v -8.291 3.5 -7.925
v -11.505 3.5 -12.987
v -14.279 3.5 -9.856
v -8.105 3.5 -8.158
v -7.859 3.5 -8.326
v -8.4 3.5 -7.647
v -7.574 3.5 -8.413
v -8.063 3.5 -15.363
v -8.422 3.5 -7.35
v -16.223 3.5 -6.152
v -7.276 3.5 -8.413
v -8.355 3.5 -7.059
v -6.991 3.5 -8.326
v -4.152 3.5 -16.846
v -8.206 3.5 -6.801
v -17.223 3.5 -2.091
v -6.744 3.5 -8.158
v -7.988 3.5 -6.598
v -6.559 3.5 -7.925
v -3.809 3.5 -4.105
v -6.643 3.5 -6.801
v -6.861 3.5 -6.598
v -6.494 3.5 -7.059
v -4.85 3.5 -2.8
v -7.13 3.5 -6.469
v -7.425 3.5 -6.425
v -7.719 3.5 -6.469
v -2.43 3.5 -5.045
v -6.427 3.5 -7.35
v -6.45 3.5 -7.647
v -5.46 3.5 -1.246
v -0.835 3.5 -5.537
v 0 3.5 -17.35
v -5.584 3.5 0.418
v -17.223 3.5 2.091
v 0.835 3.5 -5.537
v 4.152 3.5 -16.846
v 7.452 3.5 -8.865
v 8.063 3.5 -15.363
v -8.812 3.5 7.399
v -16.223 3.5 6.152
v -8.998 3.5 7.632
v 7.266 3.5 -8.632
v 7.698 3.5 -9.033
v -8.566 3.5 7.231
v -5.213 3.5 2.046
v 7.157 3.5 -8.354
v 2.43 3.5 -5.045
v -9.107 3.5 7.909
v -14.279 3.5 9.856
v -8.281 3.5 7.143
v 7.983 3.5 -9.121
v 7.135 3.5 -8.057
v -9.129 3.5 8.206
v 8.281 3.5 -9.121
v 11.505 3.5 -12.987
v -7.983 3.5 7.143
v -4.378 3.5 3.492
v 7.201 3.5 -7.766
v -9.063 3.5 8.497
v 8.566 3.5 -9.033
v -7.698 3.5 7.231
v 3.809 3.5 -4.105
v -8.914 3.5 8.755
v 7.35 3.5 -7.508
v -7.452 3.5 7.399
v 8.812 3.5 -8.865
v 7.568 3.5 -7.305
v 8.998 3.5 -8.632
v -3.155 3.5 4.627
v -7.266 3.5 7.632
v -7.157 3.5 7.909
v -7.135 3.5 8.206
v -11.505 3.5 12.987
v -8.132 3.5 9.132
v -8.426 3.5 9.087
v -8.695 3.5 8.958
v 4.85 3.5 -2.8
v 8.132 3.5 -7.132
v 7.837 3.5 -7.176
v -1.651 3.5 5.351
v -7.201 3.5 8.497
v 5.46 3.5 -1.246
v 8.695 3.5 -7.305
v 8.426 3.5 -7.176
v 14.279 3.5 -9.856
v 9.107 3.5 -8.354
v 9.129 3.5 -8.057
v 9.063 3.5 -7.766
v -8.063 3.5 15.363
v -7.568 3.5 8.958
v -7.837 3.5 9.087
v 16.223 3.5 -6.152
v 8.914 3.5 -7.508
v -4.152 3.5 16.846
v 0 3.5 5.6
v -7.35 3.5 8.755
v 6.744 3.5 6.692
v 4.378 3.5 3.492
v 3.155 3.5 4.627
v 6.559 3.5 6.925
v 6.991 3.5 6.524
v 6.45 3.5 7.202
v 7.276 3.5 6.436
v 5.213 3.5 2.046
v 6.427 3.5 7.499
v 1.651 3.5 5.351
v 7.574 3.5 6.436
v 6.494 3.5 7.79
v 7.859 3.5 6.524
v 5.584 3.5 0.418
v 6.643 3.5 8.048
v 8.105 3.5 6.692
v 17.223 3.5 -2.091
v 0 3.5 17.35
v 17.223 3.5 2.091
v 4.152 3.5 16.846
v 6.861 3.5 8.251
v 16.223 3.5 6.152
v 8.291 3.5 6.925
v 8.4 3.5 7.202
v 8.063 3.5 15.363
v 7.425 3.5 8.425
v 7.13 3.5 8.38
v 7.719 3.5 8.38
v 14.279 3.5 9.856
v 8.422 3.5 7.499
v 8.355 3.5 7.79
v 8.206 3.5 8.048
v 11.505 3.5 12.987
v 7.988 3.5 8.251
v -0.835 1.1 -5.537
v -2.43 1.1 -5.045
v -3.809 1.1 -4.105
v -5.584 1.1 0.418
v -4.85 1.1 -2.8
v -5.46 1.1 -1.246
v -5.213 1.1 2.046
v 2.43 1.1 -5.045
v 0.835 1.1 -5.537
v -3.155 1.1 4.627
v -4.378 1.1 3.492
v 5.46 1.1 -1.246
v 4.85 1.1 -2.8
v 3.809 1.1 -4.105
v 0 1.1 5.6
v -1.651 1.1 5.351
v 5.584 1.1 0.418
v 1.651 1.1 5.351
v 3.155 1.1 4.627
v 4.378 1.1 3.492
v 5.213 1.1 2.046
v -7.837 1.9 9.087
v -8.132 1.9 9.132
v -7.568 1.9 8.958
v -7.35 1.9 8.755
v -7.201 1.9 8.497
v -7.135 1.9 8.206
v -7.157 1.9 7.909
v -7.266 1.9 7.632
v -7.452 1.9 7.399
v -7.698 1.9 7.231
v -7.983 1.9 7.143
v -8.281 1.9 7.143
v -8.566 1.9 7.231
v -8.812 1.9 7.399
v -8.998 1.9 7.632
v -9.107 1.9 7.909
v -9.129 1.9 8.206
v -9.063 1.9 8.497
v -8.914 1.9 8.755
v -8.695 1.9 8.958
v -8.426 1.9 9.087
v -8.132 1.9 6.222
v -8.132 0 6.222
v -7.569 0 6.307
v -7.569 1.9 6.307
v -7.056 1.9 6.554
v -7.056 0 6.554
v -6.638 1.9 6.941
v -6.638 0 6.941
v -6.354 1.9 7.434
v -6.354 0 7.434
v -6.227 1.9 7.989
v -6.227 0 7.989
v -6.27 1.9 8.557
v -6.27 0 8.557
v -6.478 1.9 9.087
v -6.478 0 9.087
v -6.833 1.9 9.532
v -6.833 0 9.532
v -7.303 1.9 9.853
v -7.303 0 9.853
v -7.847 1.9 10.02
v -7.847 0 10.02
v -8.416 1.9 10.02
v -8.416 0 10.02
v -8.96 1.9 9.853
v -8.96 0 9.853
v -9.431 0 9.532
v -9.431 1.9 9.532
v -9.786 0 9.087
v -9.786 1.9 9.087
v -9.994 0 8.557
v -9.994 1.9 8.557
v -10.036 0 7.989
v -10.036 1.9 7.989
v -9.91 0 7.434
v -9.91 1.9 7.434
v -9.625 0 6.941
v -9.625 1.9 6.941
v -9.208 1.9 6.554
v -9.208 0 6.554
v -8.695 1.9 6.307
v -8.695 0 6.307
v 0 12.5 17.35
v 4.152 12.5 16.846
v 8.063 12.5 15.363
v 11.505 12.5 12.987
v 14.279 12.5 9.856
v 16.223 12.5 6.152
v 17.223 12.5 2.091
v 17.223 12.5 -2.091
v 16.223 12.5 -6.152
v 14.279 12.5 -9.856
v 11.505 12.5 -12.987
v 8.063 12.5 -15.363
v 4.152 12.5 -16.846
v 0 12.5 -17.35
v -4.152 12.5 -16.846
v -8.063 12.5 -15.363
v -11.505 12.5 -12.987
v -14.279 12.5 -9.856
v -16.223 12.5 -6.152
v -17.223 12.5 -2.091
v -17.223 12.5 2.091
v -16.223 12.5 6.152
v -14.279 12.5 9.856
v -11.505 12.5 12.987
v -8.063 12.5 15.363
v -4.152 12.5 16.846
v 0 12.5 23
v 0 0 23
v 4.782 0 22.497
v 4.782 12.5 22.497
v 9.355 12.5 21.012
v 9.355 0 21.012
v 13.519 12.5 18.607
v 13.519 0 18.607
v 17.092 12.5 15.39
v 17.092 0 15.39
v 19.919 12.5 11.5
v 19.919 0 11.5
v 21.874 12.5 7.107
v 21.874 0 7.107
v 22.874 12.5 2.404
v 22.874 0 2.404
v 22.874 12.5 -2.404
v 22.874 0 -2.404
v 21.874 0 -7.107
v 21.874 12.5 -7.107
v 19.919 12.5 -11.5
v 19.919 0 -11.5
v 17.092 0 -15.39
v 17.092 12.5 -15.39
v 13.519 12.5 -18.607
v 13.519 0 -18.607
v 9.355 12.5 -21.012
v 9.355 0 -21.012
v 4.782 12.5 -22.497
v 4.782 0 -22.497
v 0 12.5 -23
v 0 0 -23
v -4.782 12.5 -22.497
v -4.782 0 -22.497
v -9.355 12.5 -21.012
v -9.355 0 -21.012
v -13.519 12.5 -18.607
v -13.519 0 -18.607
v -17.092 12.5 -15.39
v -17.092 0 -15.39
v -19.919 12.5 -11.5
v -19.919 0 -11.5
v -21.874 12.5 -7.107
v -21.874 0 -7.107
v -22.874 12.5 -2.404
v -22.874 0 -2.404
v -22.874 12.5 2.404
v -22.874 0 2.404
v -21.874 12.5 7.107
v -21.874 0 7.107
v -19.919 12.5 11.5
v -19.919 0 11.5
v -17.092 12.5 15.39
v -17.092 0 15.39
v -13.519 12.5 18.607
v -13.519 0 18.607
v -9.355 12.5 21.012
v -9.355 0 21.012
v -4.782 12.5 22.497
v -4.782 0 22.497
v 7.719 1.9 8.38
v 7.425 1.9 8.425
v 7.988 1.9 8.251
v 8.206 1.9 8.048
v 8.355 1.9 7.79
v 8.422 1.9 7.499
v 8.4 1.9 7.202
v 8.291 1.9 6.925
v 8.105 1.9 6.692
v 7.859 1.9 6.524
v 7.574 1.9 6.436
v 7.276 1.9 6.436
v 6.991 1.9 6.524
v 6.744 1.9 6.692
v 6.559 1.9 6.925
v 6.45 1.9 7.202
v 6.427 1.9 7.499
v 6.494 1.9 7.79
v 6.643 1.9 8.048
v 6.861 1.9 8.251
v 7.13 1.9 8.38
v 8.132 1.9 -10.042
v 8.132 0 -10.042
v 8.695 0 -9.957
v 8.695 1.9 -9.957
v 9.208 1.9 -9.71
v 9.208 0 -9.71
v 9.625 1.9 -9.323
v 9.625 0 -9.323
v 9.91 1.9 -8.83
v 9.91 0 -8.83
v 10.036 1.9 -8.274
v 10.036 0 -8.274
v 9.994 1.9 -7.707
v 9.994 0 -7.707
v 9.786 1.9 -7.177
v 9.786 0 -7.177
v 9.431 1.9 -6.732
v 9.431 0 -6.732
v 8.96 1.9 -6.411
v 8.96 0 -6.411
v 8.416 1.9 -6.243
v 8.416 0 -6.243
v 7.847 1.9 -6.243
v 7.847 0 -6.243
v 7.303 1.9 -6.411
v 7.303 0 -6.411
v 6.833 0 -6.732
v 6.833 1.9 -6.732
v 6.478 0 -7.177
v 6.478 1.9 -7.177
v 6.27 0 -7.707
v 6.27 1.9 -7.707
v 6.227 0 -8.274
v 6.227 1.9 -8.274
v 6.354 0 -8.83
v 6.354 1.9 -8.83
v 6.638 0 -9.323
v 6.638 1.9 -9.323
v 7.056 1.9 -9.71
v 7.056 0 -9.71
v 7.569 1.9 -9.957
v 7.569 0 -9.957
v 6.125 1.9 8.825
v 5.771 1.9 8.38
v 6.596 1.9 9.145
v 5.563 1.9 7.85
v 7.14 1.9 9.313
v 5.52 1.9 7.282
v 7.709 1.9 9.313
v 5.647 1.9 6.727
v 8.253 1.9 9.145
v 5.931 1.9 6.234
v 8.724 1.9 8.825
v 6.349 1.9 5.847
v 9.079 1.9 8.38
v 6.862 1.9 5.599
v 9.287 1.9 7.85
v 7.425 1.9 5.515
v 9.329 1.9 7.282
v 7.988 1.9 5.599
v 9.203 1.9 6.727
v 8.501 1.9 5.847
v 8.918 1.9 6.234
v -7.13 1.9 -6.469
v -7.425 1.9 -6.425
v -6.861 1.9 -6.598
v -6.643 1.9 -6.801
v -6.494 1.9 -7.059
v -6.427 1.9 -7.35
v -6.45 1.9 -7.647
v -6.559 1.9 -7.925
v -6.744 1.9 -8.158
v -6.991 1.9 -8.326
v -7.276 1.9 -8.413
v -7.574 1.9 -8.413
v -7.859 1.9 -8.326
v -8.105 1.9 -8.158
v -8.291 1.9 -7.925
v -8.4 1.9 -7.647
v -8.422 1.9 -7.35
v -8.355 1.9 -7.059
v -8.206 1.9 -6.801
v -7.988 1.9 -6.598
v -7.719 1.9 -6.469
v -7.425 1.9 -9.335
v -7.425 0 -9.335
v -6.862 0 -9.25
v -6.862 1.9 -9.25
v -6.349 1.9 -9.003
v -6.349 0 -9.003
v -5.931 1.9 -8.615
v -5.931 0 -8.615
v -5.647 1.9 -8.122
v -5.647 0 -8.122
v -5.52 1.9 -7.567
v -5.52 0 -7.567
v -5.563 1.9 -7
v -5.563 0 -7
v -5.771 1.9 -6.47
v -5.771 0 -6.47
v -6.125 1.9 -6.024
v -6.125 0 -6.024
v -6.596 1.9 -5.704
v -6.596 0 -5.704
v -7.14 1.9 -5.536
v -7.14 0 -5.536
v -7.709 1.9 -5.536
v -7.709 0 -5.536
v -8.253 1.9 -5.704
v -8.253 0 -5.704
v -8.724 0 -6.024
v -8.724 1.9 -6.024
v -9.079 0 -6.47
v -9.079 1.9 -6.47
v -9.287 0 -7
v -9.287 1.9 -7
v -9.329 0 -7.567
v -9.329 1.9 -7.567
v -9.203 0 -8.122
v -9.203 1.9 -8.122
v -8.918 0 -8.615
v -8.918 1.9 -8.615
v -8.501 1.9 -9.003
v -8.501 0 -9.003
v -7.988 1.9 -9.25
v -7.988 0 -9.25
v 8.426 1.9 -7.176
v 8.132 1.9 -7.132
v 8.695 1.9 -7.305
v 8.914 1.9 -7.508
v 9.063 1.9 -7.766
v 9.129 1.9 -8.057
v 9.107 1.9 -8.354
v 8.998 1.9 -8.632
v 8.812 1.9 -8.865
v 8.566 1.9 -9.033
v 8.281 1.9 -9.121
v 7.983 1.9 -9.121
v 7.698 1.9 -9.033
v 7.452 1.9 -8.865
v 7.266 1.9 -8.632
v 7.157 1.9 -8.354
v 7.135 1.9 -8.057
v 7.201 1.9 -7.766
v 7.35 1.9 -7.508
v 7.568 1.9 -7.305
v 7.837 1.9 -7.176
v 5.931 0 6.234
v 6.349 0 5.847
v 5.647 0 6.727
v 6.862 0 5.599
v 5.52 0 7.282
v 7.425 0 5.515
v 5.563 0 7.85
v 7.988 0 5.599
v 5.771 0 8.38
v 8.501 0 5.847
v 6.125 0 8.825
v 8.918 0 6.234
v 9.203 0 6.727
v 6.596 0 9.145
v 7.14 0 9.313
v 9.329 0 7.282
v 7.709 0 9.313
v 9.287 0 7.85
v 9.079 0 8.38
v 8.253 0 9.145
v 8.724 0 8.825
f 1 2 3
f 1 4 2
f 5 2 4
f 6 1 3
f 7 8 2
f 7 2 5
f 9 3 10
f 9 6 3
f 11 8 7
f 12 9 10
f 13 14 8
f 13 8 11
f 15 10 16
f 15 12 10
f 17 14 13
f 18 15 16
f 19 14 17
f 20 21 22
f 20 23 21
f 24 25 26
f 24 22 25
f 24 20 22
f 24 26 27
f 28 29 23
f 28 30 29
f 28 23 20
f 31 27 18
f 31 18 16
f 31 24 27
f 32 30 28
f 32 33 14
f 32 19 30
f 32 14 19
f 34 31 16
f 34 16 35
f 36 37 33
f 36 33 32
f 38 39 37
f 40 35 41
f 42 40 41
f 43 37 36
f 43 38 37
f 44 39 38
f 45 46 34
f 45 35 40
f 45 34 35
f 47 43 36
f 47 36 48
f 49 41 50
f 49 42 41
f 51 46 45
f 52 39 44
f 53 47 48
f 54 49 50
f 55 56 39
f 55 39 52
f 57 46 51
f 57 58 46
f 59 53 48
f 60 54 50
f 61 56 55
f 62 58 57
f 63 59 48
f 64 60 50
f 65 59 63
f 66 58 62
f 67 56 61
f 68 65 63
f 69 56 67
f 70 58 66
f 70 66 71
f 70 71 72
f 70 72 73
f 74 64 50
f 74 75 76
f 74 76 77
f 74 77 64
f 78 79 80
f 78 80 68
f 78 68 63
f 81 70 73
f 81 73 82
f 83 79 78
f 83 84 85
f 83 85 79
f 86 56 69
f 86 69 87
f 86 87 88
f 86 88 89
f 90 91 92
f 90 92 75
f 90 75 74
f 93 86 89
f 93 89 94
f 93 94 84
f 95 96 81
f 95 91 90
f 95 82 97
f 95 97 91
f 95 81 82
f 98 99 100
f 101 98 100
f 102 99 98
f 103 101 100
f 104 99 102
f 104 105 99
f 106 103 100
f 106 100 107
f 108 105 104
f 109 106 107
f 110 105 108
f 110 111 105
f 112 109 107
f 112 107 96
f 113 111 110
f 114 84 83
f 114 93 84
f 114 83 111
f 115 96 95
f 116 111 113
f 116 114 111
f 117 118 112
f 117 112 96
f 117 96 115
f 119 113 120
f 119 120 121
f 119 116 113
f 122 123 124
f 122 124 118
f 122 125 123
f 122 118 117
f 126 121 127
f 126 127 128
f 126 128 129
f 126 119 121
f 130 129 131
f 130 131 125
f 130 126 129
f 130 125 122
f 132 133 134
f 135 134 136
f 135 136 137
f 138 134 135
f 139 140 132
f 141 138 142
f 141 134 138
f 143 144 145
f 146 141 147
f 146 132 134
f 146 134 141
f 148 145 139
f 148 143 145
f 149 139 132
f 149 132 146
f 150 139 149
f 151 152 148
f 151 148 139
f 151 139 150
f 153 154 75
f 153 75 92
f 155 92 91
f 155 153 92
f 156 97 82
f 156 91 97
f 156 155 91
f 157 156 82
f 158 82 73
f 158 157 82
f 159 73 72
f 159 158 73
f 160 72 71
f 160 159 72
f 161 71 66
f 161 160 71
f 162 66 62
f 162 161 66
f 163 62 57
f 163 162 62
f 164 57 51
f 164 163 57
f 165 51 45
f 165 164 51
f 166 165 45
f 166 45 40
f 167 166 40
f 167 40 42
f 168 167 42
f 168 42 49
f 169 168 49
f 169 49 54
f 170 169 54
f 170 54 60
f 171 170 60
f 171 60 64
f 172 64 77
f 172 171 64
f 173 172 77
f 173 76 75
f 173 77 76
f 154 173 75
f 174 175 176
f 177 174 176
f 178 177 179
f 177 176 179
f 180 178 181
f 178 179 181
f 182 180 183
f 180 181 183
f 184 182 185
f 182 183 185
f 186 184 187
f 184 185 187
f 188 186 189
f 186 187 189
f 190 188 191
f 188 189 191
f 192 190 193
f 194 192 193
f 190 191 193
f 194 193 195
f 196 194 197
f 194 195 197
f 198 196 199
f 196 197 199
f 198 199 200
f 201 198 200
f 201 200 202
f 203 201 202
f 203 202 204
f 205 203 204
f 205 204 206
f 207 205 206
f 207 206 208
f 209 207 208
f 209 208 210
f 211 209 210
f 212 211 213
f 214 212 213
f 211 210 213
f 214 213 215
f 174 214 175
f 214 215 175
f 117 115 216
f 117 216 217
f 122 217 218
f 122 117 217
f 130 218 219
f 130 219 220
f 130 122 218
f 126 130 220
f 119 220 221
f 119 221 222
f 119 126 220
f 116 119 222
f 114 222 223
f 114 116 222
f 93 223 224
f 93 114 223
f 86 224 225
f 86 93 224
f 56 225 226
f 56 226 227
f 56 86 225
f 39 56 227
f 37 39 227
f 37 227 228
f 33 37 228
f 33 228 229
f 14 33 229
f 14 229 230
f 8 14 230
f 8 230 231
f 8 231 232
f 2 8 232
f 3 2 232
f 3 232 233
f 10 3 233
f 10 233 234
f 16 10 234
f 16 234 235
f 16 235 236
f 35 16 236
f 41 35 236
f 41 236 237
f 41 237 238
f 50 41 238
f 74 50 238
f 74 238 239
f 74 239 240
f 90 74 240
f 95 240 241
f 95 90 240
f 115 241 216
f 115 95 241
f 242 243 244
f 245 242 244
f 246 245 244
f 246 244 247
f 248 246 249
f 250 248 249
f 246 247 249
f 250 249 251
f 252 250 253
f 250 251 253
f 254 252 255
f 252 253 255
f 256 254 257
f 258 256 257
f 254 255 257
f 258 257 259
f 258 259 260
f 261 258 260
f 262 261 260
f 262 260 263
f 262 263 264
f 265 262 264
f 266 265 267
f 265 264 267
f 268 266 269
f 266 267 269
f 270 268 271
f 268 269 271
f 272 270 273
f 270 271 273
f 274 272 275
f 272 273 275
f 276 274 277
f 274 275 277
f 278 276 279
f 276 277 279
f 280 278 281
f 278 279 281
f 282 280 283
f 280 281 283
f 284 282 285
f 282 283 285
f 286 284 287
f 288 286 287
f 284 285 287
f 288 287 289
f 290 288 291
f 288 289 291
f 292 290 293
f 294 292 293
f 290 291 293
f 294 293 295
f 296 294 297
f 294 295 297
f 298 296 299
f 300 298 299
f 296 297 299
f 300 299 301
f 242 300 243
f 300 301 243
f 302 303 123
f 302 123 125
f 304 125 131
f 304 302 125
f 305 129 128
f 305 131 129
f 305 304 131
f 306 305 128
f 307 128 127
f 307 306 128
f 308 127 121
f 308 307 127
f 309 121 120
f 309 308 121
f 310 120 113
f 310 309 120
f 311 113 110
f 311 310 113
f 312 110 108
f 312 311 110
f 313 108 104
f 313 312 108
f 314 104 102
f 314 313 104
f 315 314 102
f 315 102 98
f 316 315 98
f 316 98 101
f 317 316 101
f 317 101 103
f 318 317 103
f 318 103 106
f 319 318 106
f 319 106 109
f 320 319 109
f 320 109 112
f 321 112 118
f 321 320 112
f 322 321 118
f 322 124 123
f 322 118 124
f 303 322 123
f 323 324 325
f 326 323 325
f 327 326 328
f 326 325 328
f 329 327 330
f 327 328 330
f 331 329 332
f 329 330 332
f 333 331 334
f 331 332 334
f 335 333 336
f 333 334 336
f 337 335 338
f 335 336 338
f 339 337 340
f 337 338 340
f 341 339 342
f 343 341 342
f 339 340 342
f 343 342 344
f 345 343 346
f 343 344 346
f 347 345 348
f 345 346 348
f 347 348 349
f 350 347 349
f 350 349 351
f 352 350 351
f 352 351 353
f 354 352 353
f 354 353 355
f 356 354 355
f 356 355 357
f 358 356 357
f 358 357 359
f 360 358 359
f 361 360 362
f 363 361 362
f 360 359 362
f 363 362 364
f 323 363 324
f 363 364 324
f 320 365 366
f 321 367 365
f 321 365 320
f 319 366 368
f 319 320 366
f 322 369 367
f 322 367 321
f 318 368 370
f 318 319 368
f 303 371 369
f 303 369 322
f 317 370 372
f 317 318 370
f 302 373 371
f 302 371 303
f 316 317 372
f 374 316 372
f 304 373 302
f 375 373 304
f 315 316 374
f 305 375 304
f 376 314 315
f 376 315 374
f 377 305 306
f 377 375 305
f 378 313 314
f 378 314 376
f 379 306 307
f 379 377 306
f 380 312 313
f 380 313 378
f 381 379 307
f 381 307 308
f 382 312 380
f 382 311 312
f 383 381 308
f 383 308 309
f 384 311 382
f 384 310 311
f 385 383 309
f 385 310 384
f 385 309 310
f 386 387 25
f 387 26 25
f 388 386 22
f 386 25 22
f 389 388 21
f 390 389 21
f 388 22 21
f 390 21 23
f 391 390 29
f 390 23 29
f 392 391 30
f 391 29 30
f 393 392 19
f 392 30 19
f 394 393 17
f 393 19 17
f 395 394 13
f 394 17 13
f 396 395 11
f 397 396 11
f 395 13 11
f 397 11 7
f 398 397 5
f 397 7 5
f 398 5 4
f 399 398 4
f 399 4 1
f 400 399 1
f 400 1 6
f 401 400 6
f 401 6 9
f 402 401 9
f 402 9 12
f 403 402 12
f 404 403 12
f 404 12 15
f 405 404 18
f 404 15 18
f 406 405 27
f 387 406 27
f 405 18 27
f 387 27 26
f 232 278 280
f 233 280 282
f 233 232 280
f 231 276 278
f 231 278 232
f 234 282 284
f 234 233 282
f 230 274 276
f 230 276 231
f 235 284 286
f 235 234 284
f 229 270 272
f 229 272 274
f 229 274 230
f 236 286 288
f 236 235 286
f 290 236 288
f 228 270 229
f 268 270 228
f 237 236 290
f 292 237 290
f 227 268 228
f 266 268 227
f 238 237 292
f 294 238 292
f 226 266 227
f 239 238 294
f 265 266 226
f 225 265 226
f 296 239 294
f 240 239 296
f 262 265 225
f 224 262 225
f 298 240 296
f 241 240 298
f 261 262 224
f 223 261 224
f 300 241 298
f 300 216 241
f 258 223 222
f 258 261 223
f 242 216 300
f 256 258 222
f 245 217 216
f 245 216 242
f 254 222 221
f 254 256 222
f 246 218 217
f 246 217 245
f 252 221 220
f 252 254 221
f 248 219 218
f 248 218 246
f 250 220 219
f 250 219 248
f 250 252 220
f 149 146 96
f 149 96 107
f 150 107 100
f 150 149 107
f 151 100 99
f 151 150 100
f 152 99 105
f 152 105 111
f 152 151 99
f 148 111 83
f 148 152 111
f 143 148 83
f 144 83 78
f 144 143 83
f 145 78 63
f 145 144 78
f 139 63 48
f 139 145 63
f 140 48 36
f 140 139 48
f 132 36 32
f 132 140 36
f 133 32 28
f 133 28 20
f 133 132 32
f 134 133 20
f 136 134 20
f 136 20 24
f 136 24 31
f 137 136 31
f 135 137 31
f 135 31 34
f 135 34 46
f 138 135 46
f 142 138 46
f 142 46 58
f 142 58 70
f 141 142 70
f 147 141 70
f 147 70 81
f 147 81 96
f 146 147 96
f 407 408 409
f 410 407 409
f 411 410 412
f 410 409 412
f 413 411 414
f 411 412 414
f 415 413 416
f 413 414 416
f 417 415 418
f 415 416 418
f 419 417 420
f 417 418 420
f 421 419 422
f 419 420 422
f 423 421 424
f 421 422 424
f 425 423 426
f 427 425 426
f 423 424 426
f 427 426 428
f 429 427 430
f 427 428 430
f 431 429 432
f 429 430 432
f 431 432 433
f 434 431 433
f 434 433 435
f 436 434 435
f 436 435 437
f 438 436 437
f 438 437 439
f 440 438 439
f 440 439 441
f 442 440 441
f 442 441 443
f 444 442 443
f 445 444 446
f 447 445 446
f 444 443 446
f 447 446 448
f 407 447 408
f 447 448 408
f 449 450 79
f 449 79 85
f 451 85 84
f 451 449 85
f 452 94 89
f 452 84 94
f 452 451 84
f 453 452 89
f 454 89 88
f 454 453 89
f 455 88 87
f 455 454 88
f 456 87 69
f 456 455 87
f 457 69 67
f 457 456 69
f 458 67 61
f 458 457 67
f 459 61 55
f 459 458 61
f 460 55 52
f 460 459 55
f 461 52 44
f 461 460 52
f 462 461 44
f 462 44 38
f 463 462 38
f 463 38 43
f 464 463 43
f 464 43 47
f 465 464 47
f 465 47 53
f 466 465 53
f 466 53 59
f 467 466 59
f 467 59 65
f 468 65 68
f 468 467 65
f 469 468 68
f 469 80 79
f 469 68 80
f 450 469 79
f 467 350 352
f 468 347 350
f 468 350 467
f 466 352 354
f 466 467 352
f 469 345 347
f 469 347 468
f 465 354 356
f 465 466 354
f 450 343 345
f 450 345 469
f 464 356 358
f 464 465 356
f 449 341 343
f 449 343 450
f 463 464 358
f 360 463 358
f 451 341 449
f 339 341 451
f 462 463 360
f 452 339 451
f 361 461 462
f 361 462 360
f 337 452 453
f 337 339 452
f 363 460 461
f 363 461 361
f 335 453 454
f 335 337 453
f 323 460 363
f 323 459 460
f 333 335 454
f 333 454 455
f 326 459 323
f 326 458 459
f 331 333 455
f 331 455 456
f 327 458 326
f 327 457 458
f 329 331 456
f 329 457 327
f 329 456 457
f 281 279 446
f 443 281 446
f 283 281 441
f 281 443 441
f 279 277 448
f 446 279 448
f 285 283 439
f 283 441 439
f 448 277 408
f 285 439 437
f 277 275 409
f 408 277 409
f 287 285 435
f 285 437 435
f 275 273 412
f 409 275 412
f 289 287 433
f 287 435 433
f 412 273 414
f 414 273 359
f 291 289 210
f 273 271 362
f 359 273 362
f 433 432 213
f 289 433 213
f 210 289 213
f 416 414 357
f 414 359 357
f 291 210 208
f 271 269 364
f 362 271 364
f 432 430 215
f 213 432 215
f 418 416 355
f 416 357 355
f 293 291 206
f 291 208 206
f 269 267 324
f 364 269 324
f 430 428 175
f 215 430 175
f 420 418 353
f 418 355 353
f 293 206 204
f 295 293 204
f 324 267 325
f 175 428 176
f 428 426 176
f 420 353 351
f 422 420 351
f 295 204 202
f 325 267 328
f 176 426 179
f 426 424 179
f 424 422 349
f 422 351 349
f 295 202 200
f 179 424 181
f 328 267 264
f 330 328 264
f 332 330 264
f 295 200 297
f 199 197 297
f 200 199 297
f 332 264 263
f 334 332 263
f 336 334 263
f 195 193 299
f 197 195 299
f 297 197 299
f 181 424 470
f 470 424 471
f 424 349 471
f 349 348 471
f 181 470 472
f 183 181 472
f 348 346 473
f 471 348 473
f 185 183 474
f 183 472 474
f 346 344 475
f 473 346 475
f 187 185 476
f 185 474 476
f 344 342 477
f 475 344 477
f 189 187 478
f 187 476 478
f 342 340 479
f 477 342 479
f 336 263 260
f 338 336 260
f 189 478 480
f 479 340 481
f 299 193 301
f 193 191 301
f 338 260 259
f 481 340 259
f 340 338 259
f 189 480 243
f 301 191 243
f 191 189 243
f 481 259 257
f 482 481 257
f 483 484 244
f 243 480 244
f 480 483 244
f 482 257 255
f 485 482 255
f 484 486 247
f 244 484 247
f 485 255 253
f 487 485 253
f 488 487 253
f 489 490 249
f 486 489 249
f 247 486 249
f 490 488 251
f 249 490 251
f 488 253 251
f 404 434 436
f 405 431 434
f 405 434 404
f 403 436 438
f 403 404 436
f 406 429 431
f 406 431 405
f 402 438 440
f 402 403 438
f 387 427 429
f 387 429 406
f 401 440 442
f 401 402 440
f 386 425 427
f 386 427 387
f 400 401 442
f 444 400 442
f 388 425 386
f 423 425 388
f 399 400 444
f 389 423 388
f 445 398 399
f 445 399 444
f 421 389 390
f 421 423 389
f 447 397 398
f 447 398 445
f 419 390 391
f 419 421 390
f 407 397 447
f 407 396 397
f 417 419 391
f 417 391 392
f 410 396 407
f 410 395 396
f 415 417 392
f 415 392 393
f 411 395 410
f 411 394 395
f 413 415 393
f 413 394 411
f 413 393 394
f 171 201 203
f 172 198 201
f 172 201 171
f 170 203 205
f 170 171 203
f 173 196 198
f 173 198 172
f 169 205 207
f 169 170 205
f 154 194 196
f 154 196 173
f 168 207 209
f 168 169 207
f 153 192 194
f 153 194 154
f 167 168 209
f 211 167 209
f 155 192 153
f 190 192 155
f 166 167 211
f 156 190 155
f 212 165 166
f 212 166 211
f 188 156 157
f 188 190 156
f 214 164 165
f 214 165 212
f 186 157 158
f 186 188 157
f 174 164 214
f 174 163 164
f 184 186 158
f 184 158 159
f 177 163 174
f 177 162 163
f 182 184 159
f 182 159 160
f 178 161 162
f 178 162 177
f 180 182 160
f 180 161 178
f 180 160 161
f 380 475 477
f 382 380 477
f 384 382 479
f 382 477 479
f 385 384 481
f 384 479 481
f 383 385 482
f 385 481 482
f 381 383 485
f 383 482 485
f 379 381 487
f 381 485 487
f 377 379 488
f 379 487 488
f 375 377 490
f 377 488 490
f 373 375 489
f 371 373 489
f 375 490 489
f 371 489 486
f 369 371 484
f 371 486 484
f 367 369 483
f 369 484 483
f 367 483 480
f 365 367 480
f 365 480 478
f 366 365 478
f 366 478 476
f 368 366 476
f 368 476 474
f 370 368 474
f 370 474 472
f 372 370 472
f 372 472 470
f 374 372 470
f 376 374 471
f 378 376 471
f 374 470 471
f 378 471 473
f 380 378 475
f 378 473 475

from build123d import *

# Parameters (mm, degrees)
SKETCH_1_R          = 17.35
SKETCH_1_R_2        = 5.6
EXTRUDE_1_DEPTH     = 3.5
SKETCH_3_R          = 23
SKETCH_3_R_2        = 17.35
EXTRUDE_3_DEPTH     = 12.5
SKETCH_4_R          = 5.6
EXTRUDE_4_DEPTH     = 1.1
SKETCH_6_R          = 1
CUT_EXTRUDE_3_DEPTH = 5
SKETCH_8_R          = 1.91
CUT_EXTRUDE_4_DEPTH = 1.9


with BuildPart() as part:
    # 草图1 → 凸台-拉伸1 (new body)
    with BuildSketch(Plane(origin=(0, 0, 0), x_dir=(1, 0, 0), z_dir=(0, 1, 0))):
        with Locations(Location((0, 0, 0), (0, 0, 270))):
            Circle(SKETCH_1_R)
        with Locations(Location((0, 0, 0), (0, 0, 270))):
            Circle(SKETCH_1_R_2, mode=Mode.SUBTRACT)
    extrude(amount=EXTRUDE_1_DEPTH)

    # 草图3 → 凸台-拉伸3 (add)
    with BuildSketch(Plane(origin=(0, 0, 0), x_dir=(1, 0, 0), z_dir=(0, 1, 0))):
        with Locations(Location((0, 0, 0), (0, 0, 270))):
            Circle(SKETCH_3_R)
        with Locations(Location((0, 0, 0), (0, 0, 270))):
            Circle(SKETCH_3_R_2, mode=Mode.SUBTRACT)
    extrude(amount=EXTRUDE_3_DEPTH)

    # 草图4 → 凸台-拉伸4 (add)
    with BuildSketch(Plane(origin=(0, 0, 0), x_dir=(1, 0, 0), z_dir=(0, 1, 0))):
        with Locations(Location((0, 0, 0), (0, 0, 270))):
            Circle(SKETCH_4_R)
    extrude(amount=EXTRUDE_4_DEPTH)

    # 草图6 → 切除-拉伸3 (cut, symmetric)
    with BuildSketch(Plane(origin=(0, 0, 0), x_dir=(1, 0, 0), z_dir=(0, 1, 0))):
        with Locations(Location((8.131727984, 8.131727984, 0), (0, 0, 270))):
            Circle(SKETCH_6_R)
        with Locations(Location((7.424621202, -7.424621202, 0), (0, 0, 270))):
            Circle(SKETCH_6_R)
        with Locations(Location((-8.131727984, -8.131727984, 0), (0, 0, 270))):
            Circle(SKETCH_6_R)
        with Locations(Location((-7.424621202, 7.424621202, 0), (0, 0, 270))):
            Circle(SKETCH_6_R)
    extrude(amount=CUT_EXTRUDE_3_DEPTH, both=True, mode=Mode.SUBTRACT)

    # 草图8 → 切除-拉伸4 (cut)
    with BuildSketch(Plane.XZ):
        with Locations(Location((-8.131727984, 8.131727984, 0), (0, 0, 270))):
            Circle(SKETCH_8_R)
        with Locations(Location((7.424621202, 7.424621202, 0), (0, 0, 270))):
            Circle(SKETCH_8_R)
        with Locations(Location((-7.424621202, -7.424621202, 0), (0, 0, 270))):
            Circle(SKETCH_8_R)
        with Locations(Location((8.131727984, -8.131727984, 0), (0, 0, 270))):
            Circle(SKETCH_8_R)
    extrude(amount=-CUT_EXTRUDE_4_DEPTH, mode=Mode.SUBTRACT)


solid = part.part
